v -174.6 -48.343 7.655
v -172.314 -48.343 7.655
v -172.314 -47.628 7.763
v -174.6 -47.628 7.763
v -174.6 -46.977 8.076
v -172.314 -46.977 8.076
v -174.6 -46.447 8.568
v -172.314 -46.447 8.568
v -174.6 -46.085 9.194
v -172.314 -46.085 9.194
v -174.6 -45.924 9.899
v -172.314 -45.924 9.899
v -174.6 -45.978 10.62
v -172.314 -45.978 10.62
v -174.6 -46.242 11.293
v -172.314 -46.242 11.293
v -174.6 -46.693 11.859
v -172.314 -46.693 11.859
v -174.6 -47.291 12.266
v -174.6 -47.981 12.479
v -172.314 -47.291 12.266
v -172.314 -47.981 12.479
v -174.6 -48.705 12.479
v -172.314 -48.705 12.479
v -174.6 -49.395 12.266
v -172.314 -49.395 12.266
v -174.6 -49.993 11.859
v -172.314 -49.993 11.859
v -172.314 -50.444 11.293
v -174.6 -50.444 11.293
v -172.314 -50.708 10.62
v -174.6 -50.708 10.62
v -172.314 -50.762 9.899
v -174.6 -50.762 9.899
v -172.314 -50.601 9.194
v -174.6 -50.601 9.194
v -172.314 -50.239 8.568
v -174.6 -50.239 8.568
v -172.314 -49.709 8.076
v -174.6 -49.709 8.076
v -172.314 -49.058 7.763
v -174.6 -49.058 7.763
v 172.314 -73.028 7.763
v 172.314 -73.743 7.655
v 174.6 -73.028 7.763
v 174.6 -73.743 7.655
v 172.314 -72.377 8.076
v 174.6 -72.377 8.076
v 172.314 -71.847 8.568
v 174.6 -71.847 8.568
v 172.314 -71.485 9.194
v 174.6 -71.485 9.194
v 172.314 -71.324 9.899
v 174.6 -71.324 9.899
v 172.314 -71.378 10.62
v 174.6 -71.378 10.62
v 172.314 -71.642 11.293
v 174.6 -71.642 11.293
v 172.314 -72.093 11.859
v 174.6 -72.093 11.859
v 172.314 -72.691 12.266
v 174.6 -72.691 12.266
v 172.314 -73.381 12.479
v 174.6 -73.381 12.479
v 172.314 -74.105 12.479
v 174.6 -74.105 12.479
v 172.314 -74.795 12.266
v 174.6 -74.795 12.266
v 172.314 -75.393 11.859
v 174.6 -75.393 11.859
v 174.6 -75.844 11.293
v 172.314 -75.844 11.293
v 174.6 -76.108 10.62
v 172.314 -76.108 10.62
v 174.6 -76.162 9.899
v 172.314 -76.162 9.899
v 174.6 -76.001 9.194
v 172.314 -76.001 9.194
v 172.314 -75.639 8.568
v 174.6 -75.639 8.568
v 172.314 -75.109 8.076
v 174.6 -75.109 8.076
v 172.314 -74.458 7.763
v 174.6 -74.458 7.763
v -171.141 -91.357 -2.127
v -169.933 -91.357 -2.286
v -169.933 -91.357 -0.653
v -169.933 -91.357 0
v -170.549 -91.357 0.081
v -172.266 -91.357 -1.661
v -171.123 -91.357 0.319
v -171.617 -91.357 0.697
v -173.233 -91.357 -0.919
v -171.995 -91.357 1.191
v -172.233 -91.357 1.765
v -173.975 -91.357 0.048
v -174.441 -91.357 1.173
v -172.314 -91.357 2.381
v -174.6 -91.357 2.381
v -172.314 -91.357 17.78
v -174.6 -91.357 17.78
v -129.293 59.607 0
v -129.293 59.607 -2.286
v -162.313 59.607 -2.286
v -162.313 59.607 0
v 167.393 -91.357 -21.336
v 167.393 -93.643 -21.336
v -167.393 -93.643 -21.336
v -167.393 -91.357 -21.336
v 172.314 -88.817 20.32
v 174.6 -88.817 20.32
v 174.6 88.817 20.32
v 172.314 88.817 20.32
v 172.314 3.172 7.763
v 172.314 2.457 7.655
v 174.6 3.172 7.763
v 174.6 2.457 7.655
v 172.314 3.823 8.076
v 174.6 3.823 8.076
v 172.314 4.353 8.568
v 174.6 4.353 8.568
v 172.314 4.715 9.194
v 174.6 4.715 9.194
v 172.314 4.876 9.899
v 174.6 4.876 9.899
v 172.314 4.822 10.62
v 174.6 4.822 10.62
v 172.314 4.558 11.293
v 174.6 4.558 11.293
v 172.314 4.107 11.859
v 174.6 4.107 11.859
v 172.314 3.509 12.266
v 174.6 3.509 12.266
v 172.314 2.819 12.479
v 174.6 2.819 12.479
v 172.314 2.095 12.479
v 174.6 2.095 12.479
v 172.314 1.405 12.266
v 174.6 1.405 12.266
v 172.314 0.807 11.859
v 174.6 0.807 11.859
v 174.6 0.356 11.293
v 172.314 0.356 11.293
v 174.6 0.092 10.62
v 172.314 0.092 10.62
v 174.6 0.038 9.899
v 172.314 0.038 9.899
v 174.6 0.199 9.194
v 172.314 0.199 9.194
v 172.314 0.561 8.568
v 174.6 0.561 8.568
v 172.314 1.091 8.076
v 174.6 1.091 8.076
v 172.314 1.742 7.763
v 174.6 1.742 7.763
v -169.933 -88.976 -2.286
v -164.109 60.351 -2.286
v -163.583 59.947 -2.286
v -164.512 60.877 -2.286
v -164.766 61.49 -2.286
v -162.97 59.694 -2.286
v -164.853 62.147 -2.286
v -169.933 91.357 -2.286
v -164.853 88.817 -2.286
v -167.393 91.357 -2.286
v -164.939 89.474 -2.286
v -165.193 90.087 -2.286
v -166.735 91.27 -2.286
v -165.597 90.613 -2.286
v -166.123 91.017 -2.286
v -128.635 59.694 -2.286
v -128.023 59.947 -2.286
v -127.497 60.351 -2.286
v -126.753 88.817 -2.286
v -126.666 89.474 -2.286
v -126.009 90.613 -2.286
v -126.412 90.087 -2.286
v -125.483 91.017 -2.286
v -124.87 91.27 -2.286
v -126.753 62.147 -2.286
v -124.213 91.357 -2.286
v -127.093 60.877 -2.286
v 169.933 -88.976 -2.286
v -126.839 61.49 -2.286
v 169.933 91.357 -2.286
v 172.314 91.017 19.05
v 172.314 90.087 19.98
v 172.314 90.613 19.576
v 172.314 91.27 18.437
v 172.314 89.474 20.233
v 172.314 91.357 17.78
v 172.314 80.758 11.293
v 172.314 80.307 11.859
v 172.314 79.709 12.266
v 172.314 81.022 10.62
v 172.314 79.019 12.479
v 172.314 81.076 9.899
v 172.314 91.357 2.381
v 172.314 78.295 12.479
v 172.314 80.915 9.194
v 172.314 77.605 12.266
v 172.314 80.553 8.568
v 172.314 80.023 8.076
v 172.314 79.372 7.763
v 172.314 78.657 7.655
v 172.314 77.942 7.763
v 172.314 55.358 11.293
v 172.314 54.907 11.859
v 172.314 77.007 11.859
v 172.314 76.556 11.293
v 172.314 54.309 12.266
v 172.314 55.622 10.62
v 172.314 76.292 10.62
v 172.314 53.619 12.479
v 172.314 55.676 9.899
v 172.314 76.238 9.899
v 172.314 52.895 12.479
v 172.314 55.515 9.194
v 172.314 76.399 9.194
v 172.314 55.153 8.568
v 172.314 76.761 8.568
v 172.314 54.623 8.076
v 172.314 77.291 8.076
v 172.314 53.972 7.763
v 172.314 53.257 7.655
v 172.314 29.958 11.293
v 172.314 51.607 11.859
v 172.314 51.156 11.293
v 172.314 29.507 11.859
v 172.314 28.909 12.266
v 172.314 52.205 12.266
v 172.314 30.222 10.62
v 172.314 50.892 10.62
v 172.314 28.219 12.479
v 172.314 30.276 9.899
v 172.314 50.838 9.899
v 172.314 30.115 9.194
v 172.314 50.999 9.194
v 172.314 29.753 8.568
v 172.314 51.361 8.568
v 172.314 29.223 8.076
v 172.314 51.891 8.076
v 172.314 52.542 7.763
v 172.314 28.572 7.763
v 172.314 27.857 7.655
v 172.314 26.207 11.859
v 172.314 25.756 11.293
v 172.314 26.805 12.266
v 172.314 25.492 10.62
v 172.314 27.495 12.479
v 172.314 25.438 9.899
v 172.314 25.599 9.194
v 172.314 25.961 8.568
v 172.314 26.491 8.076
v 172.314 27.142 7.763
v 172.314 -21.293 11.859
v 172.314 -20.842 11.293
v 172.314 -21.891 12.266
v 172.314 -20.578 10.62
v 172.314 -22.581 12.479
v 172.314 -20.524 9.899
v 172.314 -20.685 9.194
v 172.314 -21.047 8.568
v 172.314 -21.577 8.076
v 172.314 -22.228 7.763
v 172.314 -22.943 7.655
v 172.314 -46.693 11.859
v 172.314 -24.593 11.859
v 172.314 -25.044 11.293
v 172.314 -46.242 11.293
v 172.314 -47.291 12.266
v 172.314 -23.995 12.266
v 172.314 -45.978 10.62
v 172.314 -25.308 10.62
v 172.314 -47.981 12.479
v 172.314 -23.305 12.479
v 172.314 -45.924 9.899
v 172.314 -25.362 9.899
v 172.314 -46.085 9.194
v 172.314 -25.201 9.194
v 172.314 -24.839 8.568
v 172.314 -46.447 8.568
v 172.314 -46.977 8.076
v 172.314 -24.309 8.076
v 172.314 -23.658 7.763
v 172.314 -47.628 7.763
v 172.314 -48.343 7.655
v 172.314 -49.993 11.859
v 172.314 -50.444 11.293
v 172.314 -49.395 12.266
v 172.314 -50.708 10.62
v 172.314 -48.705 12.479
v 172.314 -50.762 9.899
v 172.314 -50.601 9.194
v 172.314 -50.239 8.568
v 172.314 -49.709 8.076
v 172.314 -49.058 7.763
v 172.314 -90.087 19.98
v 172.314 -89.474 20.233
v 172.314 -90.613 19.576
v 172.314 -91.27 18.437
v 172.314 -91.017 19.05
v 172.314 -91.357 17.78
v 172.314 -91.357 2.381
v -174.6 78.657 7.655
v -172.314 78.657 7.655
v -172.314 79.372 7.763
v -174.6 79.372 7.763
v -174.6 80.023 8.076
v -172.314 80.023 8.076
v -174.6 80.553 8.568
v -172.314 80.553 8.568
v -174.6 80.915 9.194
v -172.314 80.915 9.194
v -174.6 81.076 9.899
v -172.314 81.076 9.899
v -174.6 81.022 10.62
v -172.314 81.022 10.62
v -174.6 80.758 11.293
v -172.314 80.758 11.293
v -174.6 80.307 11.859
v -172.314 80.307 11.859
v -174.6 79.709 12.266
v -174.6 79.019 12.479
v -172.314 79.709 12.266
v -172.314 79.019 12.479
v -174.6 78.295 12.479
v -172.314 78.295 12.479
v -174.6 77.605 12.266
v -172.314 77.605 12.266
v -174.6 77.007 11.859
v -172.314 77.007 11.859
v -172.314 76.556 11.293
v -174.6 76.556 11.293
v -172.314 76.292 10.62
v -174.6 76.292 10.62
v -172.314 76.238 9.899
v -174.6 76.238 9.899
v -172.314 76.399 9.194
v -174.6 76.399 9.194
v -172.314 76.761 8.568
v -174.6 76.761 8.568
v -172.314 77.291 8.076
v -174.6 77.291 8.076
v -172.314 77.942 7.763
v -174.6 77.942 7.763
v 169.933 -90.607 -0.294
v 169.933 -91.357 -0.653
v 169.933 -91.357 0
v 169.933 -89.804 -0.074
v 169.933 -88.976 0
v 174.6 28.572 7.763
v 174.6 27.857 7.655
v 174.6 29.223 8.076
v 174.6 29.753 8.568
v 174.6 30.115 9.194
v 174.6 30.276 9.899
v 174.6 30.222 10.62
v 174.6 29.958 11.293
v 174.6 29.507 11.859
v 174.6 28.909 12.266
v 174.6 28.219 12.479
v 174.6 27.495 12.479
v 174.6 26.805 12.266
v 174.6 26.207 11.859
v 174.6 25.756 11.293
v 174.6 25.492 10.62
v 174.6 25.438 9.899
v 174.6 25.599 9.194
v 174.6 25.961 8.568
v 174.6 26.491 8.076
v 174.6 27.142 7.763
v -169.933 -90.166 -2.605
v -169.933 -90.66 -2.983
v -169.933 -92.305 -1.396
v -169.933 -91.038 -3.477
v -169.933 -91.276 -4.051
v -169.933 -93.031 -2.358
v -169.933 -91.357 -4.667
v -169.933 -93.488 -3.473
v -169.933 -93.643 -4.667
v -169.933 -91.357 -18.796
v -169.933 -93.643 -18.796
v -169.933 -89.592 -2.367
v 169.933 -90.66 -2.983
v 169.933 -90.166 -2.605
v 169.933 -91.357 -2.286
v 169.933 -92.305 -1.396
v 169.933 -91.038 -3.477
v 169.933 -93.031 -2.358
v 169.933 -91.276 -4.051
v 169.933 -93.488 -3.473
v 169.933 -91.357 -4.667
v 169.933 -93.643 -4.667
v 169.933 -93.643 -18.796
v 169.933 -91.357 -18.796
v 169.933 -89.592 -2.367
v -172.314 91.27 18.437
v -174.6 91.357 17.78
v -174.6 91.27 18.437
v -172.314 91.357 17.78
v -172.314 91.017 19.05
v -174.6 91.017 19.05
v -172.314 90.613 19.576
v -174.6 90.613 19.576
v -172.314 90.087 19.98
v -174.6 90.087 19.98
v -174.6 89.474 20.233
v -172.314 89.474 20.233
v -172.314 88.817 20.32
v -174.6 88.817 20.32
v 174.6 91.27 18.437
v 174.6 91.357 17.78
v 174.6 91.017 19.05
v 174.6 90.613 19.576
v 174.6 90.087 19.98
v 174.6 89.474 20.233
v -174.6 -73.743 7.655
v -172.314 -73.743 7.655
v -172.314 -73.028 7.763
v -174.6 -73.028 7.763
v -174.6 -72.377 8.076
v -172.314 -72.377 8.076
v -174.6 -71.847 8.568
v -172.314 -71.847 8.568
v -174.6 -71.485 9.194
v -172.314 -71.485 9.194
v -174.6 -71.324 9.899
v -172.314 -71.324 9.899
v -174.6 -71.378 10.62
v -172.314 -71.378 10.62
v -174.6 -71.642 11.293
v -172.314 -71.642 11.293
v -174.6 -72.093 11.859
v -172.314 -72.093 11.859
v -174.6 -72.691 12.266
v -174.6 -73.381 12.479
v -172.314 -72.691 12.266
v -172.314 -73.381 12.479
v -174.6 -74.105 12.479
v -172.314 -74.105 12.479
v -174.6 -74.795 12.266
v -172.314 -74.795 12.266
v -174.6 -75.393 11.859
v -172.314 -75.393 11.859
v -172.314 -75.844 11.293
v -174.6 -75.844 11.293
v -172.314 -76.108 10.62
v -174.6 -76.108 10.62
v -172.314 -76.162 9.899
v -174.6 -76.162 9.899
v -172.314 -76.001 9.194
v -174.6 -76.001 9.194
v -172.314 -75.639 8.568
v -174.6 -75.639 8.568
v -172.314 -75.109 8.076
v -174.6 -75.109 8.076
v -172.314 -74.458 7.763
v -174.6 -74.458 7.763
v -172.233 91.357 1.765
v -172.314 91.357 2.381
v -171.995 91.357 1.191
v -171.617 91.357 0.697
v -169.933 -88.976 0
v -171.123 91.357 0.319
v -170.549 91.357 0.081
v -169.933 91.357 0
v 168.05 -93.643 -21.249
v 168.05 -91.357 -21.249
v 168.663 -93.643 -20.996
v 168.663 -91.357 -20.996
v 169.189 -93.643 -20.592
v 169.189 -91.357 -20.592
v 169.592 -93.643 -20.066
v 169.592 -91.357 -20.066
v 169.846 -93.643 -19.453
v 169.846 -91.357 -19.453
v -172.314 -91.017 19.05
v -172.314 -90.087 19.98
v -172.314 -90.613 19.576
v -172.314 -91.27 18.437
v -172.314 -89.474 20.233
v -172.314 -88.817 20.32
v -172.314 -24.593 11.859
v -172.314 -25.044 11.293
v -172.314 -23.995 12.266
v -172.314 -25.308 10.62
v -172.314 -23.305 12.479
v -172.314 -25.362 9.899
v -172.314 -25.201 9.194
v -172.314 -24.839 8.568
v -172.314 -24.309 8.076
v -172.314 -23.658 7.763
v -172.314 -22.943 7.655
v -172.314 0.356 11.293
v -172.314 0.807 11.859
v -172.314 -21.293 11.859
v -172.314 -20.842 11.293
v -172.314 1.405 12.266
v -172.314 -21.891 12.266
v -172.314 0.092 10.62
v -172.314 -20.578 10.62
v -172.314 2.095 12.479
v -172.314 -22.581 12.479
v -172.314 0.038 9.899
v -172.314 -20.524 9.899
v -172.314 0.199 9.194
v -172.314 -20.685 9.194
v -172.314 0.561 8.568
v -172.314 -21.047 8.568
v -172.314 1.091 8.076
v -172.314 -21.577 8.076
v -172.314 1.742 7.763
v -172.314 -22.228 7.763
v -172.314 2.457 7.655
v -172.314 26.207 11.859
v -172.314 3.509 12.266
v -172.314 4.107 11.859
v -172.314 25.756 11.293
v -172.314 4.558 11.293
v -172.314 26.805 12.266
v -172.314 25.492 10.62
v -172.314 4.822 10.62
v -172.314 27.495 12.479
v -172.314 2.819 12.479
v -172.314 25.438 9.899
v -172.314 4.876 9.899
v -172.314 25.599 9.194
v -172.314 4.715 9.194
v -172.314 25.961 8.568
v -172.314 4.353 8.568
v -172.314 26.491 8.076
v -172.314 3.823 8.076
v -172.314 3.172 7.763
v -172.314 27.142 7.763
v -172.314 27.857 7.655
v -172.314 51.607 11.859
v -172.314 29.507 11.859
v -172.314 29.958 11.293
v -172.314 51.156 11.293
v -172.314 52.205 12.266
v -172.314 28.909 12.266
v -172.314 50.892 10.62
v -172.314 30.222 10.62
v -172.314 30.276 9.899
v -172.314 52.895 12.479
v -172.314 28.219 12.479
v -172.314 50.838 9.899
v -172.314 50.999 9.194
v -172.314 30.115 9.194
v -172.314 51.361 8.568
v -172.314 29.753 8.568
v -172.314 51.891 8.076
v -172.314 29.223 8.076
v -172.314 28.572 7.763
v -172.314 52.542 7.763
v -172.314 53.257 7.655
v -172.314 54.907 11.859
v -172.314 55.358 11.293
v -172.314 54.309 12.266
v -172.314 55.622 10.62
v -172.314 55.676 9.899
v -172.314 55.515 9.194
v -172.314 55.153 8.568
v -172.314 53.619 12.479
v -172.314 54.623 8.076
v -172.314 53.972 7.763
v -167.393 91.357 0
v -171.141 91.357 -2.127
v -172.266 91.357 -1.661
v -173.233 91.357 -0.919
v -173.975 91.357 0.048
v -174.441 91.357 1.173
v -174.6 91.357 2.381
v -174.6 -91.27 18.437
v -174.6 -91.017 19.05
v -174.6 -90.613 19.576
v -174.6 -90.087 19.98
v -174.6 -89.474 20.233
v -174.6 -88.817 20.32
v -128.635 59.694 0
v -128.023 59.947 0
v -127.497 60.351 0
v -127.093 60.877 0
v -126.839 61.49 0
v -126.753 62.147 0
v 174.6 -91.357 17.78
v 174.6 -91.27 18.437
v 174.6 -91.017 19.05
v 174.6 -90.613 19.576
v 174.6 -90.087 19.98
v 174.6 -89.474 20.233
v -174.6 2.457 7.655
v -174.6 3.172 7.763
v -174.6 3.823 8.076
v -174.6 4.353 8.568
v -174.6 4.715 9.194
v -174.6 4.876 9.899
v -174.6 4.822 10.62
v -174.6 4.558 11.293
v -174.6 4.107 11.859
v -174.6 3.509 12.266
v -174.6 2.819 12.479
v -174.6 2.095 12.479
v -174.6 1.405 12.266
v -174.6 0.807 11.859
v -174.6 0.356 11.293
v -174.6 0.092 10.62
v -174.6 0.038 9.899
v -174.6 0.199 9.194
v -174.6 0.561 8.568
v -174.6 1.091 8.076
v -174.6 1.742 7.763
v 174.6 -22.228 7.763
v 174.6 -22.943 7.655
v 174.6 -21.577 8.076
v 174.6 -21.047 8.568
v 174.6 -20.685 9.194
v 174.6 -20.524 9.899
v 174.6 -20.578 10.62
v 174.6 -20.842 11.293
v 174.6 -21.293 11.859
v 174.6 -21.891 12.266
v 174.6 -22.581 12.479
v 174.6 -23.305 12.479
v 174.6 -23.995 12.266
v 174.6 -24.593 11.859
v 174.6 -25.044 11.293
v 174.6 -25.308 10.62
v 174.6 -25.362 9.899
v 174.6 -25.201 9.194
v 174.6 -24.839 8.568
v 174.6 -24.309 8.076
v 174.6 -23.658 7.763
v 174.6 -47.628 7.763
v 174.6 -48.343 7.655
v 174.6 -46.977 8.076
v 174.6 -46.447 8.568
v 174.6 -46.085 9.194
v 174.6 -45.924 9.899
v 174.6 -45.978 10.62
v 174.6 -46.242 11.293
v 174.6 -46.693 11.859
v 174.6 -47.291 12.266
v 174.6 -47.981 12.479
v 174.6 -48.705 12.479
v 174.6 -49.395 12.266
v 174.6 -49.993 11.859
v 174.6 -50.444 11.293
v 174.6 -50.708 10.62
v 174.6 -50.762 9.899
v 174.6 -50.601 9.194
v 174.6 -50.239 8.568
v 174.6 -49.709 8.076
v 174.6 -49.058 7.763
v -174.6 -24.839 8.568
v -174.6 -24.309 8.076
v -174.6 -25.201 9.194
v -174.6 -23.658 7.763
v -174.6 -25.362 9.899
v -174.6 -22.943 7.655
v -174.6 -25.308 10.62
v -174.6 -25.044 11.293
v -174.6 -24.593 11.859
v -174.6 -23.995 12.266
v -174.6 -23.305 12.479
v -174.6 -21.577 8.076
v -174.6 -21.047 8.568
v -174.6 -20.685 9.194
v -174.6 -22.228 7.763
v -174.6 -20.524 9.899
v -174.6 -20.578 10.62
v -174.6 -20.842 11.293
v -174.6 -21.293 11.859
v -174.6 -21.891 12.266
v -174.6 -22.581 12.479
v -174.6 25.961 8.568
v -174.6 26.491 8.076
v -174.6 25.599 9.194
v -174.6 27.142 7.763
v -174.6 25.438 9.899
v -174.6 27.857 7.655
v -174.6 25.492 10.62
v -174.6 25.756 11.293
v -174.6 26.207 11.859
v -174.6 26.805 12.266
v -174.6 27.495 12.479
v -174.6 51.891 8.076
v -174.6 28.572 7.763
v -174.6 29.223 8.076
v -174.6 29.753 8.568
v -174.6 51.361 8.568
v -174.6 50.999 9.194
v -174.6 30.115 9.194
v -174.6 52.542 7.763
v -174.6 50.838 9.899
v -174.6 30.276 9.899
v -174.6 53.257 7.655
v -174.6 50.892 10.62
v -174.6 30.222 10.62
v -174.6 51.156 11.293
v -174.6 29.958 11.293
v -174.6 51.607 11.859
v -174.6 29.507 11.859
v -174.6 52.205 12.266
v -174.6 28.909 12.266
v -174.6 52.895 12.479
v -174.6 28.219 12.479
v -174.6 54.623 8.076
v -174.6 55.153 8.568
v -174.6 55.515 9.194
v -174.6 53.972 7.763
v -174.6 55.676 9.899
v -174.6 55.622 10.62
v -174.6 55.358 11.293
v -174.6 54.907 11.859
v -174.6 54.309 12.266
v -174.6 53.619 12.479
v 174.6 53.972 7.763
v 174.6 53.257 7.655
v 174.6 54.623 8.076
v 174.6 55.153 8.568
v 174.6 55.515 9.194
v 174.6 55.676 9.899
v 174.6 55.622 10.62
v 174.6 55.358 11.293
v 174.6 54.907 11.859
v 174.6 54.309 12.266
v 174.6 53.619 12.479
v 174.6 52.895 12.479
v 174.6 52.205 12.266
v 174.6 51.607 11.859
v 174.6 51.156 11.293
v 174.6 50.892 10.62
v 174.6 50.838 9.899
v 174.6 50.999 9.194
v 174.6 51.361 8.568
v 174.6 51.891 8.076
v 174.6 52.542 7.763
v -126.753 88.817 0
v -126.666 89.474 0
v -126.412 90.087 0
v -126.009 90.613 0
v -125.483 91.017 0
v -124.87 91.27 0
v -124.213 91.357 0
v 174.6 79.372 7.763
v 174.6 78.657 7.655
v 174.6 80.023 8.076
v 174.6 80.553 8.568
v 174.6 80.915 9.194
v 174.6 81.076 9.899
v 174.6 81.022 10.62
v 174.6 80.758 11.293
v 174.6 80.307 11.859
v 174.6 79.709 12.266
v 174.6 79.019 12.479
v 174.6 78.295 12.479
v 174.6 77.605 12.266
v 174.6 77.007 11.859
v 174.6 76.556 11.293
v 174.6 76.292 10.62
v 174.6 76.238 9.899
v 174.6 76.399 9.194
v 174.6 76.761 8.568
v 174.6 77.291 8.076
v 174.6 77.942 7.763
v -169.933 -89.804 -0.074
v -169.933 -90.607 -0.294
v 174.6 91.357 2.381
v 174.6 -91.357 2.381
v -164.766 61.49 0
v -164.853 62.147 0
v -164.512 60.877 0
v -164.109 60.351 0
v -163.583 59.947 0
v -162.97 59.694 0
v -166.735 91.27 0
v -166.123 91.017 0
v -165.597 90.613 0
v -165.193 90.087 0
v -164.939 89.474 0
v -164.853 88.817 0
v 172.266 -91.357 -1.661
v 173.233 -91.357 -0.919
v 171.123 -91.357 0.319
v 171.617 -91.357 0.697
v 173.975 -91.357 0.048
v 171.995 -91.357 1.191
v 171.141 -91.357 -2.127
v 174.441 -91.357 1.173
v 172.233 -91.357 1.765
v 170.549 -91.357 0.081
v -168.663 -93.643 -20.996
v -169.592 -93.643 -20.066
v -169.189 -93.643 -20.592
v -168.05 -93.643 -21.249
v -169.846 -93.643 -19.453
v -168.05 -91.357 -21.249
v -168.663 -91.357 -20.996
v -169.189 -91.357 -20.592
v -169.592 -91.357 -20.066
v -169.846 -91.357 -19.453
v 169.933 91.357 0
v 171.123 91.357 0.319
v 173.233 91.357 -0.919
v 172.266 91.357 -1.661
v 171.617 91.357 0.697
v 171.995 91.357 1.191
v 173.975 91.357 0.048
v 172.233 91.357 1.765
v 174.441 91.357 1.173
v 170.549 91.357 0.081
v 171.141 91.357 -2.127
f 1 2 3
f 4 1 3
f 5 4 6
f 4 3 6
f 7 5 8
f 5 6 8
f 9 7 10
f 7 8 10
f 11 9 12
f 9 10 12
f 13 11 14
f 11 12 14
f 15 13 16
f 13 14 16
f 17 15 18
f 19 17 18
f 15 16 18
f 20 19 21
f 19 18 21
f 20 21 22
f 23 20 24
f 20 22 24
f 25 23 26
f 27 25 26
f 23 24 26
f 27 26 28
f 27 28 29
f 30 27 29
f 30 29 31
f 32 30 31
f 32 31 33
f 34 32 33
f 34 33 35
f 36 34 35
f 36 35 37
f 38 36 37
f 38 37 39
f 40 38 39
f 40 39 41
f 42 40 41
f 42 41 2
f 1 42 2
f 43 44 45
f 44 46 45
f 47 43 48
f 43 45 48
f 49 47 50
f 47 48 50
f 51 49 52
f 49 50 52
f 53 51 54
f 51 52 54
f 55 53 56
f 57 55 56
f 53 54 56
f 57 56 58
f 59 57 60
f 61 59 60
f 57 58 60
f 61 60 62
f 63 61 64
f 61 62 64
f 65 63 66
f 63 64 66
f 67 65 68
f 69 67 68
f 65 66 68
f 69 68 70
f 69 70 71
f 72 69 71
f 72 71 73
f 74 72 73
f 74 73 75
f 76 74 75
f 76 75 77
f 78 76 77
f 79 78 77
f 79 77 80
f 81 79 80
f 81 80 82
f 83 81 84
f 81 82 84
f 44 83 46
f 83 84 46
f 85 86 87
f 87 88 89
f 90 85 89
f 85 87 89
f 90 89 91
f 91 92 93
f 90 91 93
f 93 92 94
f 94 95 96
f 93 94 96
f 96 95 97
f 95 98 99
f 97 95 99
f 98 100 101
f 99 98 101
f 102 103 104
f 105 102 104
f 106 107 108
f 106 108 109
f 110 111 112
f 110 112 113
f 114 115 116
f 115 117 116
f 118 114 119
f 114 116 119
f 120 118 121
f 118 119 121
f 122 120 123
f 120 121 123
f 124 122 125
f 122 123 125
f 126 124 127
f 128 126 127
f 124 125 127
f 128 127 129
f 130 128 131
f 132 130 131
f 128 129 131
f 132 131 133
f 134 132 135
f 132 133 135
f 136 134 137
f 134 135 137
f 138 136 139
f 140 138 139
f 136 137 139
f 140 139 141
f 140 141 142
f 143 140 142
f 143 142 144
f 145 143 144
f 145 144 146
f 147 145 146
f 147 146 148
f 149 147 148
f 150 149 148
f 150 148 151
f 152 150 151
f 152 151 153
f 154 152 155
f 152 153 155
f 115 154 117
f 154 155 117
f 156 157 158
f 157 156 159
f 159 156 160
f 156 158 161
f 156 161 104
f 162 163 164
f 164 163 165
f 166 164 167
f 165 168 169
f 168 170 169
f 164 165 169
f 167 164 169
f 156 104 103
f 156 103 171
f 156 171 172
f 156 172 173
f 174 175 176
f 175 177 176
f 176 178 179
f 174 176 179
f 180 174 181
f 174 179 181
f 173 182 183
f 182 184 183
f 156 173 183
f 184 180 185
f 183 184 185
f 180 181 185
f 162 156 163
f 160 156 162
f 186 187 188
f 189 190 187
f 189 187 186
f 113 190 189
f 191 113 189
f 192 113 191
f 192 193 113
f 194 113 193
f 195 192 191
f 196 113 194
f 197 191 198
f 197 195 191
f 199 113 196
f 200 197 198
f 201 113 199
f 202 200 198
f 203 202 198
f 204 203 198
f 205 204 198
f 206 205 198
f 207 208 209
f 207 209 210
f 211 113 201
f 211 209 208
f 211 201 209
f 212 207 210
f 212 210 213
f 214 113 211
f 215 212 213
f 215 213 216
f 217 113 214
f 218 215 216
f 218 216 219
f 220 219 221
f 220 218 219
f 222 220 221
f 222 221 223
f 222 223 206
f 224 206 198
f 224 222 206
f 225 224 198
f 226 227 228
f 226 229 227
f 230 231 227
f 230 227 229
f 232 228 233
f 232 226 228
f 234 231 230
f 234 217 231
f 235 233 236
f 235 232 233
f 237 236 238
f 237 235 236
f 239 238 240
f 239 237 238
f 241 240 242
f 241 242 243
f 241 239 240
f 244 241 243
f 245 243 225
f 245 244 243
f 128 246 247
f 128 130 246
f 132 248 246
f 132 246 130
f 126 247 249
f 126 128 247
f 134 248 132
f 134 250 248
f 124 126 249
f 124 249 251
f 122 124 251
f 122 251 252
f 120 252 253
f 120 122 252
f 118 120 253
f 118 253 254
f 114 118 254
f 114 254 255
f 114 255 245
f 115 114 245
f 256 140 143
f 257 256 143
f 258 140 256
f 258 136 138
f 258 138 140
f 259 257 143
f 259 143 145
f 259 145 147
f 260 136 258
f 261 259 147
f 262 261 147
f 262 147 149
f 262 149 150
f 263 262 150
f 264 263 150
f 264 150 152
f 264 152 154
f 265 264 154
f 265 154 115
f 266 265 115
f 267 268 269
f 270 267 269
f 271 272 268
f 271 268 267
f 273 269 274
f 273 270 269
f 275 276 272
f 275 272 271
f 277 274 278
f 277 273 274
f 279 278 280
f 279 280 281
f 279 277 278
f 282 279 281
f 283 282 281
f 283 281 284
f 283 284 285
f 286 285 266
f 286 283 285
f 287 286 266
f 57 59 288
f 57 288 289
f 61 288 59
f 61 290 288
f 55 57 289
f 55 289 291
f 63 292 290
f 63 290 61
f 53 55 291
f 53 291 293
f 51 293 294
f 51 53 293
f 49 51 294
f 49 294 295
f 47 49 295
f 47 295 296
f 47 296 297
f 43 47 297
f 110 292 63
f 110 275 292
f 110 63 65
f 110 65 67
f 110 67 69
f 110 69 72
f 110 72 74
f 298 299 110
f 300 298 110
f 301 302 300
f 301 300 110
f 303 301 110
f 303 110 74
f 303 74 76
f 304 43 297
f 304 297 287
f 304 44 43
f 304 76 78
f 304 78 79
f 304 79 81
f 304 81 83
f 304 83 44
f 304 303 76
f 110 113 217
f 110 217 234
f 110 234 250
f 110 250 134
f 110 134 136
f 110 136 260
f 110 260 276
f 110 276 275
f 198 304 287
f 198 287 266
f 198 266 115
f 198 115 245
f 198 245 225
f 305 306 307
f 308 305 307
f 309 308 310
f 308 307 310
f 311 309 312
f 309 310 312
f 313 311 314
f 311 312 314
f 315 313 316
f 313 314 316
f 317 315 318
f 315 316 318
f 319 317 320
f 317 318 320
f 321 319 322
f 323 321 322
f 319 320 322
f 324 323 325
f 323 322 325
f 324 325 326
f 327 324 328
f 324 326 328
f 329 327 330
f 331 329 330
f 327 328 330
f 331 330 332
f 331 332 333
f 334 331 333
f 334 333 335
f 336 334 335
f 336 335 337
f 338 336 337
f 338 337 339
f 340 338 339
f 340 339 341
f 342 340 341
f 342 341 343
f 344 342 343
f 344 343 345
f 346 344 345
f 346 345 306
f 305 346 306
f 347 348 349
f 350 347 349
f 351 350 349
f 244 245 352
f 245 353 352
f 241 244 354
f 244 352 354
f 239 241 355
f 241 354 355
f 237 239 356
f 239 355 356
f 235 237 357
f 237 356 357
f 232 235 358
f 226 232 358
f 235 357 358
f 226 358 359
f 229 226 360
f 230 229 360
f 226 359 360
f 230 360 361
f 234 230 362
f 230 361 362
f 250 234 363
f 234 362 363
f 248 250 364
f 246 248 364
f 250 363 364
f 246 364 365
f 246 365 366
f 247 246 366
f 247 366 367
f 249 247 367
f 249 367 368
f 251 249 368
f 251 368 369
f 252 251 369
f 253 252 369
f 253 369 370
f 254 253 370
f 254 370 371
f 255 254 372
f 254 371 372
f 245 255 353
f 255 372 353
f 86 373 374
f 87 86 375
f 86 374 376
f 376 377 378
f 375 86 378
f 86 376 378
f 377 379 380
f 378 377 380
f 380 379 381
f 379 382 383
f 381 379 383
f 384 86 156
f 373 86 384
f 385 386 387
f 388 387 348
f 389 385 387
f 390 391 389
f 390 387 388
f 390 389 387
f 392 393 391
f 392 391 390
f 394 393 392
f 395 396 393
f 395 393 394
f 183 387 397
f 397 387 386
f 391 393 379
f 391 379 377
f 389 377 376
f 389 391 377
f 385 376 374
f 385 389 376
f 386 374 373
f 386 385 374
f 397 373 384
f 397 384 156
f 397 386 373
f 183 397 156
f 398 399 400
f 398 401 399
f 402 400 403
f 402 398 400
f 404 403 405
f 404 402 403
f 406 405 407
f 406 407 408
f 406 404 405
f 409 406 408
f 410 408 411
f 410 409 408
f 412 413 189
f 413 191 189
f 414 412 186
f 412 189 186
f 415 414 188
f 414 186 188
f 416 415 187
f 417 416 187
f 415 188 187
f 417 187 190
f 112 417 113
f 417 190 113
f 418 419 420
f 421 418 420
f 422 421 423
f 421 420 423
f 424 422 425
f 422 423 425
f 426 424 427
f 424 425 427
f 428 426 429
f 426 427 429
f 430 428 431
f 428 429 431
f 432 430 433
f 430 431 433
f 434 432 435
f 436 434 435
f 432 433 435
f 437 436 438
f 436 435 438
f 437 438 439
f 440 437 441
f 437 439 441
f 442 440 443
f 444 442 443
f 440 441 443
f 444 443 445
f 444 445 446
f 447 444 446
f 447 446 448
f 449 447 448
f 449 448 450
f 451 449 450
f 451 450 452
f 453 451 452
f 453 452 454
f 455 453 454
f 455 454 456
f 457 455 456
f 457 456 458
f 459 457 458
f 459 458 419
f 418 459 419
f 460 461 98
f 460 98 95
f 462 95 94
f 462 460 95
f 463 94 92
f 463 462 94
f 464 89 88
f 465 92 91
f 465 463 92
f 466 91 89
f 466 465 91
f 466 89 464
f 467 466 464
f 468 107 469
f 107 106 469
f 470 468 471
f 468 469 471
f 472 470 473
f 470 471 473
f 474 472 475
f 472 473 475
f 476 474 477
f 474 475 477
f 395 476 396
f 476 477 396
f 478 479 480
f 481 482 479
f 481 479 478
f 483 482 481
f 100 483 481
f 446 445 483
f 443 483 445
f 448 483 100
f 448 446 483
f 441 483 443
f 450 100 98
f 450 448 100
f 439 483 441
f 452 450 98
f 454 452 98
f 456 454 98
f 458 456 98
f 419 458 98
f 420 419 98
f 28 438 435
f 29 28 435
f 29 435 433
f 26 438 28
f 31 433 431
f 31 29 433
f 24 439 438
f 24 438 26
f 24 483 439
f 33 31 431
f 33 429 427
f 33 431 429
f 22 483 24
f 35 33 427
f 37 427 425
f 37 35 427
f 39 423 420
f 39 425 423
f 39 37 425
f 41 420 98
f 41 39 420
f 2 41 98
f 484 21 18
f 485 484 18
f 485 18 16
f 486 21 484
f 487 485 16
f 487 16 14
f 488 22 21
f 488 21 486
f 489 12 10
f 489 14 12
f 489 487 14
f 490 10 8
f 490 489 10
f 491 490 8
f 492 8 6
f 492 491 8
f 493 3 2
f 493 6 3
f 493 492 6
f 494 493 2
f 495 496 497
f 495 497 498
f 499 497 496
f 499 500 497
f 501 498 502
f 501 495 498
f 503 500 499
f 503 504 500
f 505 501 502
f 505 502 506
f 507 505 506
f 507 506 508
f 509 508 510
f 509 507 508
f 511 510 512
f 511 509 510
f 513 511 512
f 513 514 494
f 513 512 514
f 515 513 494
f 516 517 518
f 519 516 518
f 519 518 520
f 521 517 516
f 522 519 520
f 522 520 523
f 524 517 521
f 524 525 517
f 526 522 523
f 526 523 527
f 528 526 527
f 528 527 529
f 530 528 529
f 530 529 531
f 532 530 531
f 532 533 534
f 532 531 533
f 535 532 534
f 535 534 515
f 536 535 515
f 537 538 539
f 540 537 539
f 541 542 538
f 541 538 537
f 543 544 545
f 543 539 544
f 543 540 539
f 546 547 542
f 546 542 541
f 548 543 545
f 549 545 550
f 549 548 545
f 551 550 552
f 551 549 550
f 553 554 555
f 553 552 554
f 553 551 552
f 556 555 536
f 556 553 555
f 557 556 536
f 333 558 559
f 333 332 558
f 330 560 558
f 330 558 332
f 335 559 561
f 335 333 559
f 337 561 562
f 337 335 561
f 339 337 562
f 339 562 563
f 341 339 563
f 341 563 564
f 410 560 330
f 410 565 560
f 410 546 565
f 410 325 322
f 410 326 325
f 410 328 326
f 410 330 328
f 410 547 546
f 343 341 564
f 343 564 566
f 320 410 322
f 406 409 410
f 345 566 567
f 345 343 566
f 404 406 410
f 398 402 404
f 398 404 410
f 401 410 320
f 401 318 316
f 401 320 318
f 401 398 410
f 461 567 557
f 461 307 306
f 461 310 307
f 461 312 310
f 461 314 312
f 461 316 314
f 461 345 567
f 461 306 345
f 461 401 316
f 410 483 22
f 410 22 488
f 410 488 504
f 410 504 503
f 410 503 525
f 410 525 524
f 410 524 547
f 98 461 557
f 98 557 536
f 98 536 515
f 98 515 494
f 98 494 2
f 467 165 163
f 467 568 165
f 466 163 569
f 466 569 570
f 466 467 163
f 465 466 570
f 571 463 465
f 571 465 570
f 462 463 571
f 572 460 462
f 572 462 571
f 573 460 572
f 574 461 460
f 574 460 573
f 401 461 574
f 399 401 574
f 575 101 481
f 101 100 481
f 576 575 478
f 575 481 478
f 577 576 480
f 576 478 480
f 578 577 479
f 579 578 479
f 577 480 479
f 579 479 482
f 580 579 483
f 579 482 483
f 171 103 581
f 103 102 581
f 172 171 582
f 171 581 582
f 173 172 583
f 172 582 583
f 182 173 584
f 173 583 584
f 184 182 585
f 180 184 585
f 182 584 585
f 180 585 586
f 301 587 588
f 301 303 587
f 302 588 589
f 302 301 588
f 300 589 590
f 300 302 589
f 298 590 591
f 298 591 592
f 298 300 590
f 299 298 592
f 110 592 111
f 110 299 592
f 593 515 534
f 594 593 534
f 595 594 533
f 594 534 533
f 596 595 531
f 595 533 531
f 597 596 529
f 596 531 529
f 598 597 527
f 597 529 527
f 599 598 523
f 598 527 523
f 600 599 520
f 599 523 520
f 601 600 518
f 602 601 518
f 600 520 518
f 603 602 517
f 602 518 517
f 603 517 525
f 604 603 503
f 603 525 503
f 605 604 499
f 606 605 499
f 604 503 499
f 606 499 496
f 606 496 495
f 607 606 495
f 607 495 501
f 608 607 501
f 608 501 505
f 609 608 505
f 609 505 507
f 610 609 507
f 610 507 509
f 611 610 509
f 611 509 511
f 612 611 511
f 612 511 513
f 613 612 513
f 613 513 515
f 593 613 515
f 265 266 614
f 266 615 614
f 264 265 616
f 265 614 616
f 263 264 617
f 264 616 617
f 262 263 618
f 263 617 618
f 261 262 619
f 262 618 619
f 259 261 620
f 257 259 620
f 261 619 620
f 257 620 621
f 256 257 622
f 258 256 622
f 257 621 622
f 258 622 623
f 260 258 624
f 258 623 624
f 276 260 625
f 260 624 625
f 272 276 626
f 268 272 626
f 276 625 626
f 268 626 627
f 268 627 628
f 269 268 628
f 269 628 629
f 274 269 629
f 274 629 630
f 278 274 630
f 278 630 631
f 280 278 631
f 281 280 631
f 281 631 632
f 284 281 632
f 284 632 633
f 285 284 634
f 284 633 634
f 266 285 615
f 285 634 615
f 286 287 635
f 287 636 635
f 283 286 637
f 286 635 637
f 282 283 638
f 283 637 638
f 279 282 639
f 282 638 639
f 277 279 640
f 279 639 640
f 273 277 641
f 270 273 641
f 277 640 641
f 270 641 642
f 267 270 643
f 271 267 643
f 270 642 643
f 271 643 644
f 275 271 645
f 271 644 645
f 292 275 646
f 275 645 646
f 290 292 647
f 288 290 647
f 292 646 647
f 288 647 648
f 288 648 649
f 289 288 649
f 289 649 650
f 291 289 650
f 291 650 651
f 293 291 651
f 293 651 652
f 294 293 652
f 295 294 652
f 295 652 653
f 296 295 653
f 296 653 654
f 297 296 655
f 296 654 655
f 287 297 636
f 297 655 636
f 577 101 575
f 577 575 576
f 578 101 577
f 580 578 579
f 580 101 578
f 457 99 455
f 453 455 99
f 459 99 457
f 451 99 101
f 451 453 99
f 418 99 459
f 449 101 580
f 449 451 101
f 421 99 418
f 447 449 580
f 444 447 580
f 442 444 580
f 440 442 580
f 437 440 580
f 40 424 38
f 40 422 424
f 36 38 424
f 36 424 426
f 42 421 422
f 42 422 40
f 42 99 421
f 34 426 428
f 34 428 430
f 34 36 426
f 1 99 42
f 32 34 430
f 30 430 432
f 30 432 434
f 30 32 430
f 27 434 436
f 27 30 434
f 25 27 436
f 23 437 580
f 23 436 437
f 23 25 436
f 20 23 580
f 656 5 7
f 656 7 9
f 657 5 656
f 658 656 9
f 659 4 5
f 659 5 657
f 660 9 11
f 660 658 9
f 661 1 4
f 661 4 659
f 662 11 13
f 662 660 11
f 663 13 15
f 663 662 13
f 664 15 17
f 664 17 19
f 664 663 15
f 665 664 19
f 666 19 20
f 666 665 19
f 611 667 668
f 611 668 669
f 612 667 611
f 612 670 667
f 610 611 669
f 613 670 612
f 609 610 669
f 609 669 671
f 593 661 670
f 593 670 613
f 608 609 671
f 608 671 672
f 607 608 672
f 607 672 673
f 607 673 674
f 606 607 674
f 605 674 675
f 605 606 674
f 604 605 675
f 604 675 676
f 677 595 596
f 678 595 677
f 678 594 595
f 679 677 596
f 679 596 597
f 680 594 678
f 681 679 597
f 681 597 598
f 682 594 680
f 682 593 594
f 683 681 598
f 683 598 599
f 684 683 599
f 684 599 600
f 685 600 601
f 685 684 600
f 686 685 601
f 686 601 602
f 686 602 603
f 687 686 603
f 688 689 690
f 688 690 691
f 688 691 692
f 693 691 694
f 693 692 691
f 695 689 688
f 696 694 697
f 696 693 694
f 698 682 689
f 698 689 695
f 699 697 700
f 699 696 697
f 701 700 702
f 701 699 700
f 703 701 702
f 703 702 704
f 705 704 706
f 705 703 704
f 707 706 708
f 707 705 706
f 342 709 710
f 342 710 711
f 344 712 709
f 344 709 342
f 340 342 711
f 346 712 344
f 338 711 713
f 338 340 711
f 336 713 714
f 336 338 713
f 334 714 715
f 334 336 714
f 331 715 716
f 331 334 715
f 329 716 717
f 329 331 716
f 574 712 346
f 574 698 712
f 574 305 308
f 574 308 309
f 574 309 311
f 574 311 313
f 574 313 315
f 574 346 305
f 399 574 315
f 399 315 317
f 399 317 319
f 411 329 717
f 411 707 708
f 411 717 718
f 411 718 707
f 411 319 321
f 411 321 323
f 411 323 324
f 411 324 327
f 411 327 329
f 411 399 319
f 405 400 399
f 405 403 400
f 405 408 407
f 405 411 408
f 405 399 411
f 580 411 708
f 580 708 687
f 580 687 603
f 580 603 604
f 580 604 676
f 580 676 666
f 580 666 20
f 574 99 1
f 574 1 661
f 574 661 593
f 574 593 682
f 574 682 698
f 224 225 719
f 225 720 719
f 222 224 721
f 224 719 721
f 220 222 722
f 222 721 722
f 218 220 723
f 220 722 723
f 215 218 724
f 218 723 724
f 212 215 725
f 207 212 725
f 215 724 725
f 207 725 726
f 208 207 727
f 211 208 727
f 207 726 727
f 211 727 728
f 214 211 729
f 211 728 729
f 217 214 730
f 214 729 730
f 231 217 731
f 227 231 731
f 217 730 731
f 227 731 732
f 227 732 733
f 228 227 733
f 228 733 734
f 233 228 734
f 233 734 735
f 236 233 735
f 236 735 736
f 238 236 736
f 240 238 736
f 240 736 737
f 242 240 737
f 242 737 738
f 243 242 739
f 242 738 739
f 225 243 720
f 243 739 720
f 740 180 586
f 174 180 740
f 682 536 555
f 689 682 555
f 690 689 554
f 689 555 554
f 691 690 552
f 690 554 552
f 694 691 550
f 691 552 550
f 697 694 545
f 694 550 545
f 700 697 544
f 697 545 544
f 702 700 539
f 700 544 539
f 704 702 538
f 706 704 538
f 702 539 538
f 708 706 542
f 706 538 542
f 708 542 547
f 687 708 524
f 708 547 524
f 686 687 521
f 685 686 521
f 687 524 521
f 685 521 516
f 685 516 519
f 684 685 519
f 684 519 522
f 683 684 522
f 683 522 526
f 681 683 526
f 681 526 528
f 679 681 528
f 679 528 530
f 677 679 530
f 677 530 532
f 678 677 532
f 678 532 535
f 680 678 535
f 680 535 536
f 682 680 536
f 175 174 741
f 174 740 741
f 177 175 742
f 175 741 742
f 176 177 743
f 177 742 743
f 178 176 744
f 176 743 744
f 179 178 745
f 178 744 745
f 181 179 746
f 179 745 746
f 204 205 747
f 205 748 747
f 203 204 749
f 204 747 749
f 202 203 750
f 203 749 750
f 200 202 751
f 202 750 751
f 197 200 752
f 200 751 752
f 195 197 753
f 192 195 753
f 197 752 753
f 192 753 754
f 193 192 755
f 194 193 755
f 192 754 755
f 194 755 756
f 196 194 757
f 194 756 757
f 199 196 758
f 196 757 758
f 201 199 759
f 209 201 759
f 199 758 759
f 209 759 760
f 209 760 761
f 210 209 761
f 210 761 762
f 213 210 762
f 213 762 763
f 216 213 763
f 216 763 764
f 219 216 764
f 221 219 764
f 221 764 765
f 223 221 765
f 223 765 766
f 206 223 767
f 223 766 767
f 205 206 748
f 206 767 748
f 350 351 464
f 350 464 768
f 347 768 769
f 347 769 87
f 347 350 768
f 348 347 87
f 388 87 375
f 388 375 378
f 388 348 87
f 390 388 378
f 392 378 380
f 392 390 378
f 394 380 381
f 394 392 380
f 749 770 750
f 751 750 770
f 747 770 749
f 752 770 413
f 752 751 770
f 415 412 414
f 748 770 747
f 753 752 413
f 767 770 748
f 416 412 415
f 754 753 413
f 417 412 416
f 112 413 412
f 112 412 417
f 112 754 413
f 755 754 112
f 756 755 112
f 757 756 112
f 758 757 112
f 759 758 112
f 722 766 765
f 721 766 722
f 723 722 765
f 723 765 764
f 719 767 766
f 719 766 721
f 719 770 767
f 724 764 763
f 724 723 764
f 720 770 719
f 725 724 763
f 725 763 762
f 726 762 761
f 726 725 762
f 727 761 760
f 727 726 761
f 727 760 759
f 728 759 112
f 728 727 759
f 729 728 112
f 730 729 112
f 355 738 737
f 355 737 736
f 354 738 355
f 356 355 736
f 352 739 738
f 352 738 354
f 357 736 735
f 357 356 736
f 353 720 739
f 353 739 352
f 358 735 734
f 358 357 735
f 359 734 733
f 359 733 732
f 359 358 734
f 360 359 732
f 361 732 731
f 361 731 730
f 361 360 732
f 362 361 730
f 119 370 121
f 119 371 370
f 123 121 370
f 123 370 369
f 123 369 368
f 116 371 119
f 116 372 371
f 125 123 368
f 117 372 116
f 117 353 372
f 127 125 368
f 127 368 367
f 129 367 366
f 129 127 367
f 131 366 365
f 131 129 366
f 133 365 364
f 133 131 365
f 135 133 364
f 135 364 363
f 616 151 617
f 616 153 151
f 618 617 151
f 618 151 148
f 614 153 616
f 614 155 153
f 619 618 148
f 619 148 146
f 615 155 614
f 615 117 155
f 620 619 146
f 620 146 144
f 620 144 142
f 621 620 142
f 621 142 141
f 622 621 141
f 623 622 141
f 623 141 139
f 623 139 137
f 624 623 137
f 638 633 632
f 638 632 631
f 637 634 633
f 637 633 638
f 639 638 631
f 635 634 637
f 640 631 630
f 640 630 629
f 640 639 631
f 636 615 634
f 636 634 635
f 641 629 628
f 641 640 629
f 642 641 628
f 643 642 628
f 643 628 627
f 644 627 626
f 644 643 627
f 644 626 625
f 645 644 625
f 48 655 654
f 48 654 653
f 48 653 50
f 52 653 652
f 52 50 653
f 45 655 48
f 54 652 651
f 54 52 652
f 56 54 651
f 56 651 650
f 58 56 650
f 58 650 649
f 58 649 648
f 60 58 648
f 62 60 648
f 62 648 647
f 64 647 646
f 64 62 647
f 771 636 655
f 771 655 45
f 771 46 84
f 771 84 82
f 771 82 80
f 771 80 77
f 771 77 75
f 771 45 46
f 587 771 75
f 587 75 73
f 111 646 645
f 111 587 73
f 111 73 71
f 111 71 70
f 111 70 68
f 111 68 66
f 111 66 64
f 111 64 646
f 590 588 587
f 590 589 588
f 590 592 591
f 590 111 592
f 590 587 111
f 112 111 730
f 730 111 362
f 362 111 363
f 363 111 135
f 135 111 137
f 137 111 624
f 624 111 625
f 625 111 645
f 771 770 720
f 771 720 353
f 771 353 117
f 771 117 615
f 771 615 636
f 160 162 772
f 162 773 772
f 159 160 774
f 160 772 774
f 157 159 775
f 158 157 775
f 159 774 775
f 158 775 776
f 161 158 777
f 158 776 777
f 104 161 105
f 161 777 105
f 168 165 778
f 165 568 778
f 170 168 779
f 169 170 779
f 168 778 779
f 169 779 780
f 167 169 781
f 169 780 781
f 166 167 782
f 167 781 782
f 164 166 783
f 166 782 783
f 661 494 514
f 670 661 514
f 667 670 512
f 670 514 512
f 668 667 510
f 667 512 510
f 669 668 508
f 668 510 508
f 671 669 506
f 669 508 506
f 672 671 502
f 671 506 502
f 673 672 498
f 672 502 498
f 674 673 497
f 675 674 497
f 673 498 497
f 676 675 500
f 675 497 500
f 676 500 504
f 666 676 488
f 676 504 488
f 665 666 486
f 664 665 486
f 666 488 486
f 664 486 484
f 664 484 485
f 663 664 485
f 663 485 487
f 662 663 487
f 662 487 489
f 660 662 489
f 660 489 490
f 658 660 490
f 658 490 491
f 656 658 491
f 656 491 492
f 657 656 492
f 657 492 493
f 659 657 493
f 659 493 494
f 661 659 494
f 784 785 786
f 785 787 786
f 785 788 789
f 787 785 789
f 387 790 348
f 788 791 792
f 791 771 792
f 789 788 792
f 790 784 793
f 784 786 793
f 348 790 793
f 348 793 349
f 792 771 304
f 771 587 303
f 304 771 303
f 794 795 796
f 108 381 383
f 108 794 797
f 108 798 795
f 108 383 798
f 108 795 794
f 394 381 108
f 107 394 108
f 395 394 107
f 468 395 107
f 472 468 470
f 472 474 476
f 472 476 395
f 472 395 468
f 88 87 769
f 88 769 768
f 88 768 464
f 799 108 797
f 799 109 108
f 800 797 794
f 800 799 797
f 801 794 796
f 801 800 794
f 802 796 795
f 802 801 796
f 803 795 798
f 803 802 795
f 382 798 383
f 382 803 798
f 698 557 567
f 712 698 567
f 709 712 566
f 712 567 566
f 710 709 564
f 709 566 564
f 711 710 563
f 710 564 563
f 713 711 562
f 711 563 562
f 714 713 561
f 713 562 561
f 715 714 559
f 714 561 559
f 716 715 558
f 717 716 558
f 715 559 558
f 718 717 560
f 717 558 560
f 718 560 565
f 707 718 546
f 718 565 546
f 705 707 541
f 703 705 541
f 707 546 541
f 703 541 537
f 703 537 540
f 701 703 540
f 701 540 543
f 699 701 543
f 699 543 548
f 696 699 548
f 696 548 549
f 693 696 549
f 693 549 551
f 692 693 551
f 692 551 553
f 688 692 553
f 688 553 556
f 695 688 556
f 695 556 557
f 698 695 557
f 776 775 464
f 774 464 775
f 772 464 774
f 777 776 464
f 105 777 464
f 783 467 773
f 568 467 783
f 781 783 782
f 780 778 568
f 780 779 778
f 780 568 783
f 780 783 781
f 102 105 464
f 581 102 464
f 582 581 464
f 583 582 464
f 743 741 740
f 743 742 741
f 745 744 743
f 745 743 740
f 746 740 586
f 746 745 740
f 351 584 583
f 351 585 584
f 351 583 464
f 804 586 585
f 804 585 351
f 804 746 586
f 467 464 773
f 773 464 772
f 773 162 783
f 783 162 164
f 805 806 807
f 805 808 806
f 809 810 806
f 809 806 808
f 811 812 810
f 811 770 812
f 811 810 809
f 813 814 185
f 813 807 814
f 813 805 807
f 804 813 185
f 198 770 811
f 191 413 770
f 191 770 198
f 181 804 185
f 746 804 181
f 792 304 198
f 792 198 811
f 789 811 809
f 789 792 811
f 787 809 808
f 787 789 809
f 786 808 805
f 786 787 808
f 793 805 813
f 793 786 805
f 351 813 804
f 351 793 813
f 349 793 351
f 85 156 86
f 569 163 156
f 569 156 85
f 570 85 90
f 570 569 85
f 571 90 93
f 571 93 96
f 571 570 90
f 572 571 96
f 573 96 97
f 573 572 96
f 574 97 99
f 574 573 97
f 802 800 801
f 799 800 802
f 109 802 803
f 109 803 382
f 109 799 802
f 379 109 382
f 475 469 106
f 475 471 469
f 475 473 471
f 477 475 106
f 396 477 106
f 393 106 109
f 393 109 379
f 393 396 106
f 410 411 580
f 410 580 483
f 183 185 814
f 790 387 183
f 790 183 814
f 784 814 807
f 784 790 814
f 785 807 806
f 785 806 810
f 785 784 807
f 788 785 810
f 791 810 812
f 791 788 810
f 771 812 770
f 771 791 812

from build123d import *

# Parameters (mm, degrees)
SKETCH1_W                       = 344.6280001
SKETCH1_H                       = 182.714000078
BASE_FLANGE1_DEPTH              = 2.286
EDGE_FLANGE1_STRIP_W            = 13.9065
EDGE_FLANGE1_STRIP_H            = 2.286
EDGE_FLANGE1_STRIP_CUT_DEPTH    = 182.714000078
EDGE_FLANGE1_STRIP_2_W          = 13.9065
EDGE_FLANGE1_STRIP_2_H          = 2.286
EDGE_FLANGE1_STRIP_CUT_2_DEPTH  = 182.714000078
EDGE_FLANGE1_DEPTH              = 182.714000078
EDGE_FLANGE1_BEND_DEPTH         = 182.714000078
EDGE_FLANGE2_STRIP_W            = 13.9065
EDGE_FLANGE2_STRIP_H            = 2.286
EDGE_FLANGE2_STRIP_CUT_DEPTH    = 339.8655001
EDGE_FLANGE2_DEPTH              = 339.8655001
SKETCH17_W                      = 38.1
SKETCH17_H                      = 31.75
CUT_EXTRUDE1_DEPTH              = 200.412142834
FILLET1_R                       = 2.54
F_11_0_191_DIAMETER_HOLE1_D     = 4.8514
F_11_0_191_DIAMETER_HOLE1_DEPTH = 349.2000001
F_11_0_191_DIAMETER_HOLE1_TIP   = 1.457507604


# Sheet-metal steps are written as plain solids
with BuildPart() as part:
    # Sketch1 → Base-Flange1 (new body)
    with BuildSketch(Plane.XY):
        Rectangle(SKETCH1_W, SKETCH1_H)
    extrude(amount=-BASE_FLANGE1_DEPTH)

    # Edge-Flange1 strip (across the edge) → Edge-Flange1 strip cut (cut)
    with BuildSketch(Plane(origin=(172.31400005, -91.357000039, 0), x_dir=(-1, 0, 0), z_dir=(0, 1, 0))):
        with Locations((-4.572, -1.143)):
            Rectangle(EDGE_FLANGE1_STRIP_W, EDGE_FLANGE1_STRIP_H)
    extrude(amount=EDGE_FLANGE1_STRIP_CUT_DEPTH, mode=Mode.SUBTRACT)

    # Edge-Flange1 strip 2 (across the edge) → Edge-Flange1 strip cut 2 (cut)
    with BuildSketch(Plane(origin=(-172.31400005, 91.357000039, 0), x_dir=(1, 0, 0), z_dir=(0, -1, 0))):
        with Locations((-4.572, -1.143)):
            Rectangle(EDGE_FLANGE1_STRIP_2_W, EDGE_FLANGE1_STRIP_2_H)
    extrude(amount=EDGE_FLANGE1_STRIP_CUT_2_DEPTH, mode=Mode.SUBTRACT)

    # Edge-Flange1 section (across the edge) → Edge-Flange1 (add)
    with BuildSketch(Plane(origin=(172.31400005, -91.357000039, 0), x_dir=(-1, 0, 0), z_dir=(0, 1, 0))):
        with BuildLine():
            Line((-2.286, 2.38125), (-2.286, 20.32))
            Line((-2.286, 20.32), (0, 20.32))
            Line((0, 20.32), (0, 2.38125))
            ThreePointArc((0, 2.38125), (0.697451977, 0.697451977), (2.38125, 0))
            Line((2.38125, 0), (2.38125, -2.286))
            ThreePointArc((2.38125, -2.286), (-0.918994124, -0.918994124), (-2.286, 2.38125))
        make_face()
    extrude(amount=EDGE_FLANGE1_DEPTH)

    # Edge-Flange1 section 2 (across the edge) → Edge-Flange1 bend (add)
    with BuildSketch(Plane(origin=(-172.31400005, 91.357000039, 0), x_dir=(1, 0, 0), z_dir=(0, -1, 0))):
        with BuildLine():
            Line((-2.286, 2.38125), (-2.286, 20.32))
            Line((-2.286, 20.32), (0, 20.32))
            Line((0, 20.32), (0, 2.38125))
            ThreePointArc((0, 2.38125), (0.697451977, 0.697451977), (2.38125, 0))
            Line((2.38125, 0), (2.38125, -2.286))
            ThreePointArc((2.38125, -2.286), (-0.918994124, -0.918994124), (-2.286, 2.38125))
        make_face()
    extrude(amount=EDGE_FLANGE1_BEND_DEPTH)

    # Edge-Flange2 strip (across the edge) → Edge-Flange2 strip cut (cut)
    with BuildSketch(Plane(origin=(169.93275005, -91.357000039, -2.286), x_dir=(0, 1, 0), z_dir=(-1, 0, 0))):
        with Locations((-4.572, -1.143)):
            Rectangle(EDGE_FLANGE2_STRIP_W, EDGE_FLANGE2_STRIP_H)
    extrude(amount=EDGE_FLANGE2_STRIP_CUT_DEPTH, mode=Mode.SUBTRACT)

    # Edge-Flange2 section (across the edge) → Edge-Flange2 (add)
    with BuildSketch(Plane(origin=(169.93275005, -91.357000039, -2.286), x_dir=(0, 1, 0), z_dir=(-1, 0, 0))):
        with BuildLine():
            Line((-2.286, 2.38125), (-2.286, 19.05))
            Line((-2.286, 19.05), (0, 19.05))
            Line((0, 19.05), (0, 2.38125))
            ThreePointArc((0, 2.38125), (0.697451977, 0.697451977), (2.38125, 0))
            Line((2.38125, 0), (2.38125, -2.286))
            ThreePointArc((2.38125, -2.286), (-0.918994124, -0.918994124), (-2.286, 2.38125))
        make_face()
    extrude(amount=EDGE_FLANGE2_DEPTH)

    # Sketch17 → Cut-Extrude1 (cut, through all)
    with BuildSketch(Plane(origin=(0, 0, -2.286), x_dir=(-1, 0, 0), z_dir=(0, 0, -1))):
        with Locations((145.80275005, 75.482000039)):
            Rectangle(SKETCH17_W, SKETCH17_H)
    extrude(amount=-CUT_EXTRUDE1_DEPTH, mode=Mode.SUBTRACT)

    # Fillet1
    fillet1_edges = [part.edges().sort_by_distance(p)[0] for p in [
        (169.93275005, -92.500000039, -21.336),
        (-169.93275005, -92.500000039, -21.336),
        (-126.75275005, 91.357000039, -1.143),
        (-164.85275005, 91.357000039, -1.143),
        (-164.85275005, 59.607000039, -1.143),
        (-126.75275005, 59.607000039, -1.143),
        (173.45700005, -91.357000039, 20.32),
        (173.45700005, 91.357000039, 20.32),
        (-173.45700005, 91.357000039, 20.32),
        (-173.45700005, -91.357000039, 20.32),
    ]]
    fillet(fillet1_edges, radius=FILLET1_R)

    # #11 (0.191) Diameter Hole1
    with Locations(Plane.ZY.offset(174.60000005)):
        with Locations((10.080625, -73.742999961), (10.080625, 78.657000039), (10.080625, 53.257000039), (10.080625, 27.857000039), (10.080625, 2.457000039), (10.080625, -22.942999961), (10.080625, -48.342999961)):
            Hole(F_11_0_191_DIAMETER_HOLE1_D / 2, depth=F_11_0_191_DIAMETER_HOLE1_DEPTH)
            with Locations((0, 0, -(F_11_0_191_DIAMETER_HOLE1_DEPTH + F_11_0_191_DIAMETER_HOLE1_TIP / 2))):  # 118° drill point
                Cone(0, F_11_0_191_DIAMETER_HOLE1_D / 2, F_11_0_191_DIAMETER_HOLE1_TIP, mode=Mode.SUBTRACT)


solid = part.part
